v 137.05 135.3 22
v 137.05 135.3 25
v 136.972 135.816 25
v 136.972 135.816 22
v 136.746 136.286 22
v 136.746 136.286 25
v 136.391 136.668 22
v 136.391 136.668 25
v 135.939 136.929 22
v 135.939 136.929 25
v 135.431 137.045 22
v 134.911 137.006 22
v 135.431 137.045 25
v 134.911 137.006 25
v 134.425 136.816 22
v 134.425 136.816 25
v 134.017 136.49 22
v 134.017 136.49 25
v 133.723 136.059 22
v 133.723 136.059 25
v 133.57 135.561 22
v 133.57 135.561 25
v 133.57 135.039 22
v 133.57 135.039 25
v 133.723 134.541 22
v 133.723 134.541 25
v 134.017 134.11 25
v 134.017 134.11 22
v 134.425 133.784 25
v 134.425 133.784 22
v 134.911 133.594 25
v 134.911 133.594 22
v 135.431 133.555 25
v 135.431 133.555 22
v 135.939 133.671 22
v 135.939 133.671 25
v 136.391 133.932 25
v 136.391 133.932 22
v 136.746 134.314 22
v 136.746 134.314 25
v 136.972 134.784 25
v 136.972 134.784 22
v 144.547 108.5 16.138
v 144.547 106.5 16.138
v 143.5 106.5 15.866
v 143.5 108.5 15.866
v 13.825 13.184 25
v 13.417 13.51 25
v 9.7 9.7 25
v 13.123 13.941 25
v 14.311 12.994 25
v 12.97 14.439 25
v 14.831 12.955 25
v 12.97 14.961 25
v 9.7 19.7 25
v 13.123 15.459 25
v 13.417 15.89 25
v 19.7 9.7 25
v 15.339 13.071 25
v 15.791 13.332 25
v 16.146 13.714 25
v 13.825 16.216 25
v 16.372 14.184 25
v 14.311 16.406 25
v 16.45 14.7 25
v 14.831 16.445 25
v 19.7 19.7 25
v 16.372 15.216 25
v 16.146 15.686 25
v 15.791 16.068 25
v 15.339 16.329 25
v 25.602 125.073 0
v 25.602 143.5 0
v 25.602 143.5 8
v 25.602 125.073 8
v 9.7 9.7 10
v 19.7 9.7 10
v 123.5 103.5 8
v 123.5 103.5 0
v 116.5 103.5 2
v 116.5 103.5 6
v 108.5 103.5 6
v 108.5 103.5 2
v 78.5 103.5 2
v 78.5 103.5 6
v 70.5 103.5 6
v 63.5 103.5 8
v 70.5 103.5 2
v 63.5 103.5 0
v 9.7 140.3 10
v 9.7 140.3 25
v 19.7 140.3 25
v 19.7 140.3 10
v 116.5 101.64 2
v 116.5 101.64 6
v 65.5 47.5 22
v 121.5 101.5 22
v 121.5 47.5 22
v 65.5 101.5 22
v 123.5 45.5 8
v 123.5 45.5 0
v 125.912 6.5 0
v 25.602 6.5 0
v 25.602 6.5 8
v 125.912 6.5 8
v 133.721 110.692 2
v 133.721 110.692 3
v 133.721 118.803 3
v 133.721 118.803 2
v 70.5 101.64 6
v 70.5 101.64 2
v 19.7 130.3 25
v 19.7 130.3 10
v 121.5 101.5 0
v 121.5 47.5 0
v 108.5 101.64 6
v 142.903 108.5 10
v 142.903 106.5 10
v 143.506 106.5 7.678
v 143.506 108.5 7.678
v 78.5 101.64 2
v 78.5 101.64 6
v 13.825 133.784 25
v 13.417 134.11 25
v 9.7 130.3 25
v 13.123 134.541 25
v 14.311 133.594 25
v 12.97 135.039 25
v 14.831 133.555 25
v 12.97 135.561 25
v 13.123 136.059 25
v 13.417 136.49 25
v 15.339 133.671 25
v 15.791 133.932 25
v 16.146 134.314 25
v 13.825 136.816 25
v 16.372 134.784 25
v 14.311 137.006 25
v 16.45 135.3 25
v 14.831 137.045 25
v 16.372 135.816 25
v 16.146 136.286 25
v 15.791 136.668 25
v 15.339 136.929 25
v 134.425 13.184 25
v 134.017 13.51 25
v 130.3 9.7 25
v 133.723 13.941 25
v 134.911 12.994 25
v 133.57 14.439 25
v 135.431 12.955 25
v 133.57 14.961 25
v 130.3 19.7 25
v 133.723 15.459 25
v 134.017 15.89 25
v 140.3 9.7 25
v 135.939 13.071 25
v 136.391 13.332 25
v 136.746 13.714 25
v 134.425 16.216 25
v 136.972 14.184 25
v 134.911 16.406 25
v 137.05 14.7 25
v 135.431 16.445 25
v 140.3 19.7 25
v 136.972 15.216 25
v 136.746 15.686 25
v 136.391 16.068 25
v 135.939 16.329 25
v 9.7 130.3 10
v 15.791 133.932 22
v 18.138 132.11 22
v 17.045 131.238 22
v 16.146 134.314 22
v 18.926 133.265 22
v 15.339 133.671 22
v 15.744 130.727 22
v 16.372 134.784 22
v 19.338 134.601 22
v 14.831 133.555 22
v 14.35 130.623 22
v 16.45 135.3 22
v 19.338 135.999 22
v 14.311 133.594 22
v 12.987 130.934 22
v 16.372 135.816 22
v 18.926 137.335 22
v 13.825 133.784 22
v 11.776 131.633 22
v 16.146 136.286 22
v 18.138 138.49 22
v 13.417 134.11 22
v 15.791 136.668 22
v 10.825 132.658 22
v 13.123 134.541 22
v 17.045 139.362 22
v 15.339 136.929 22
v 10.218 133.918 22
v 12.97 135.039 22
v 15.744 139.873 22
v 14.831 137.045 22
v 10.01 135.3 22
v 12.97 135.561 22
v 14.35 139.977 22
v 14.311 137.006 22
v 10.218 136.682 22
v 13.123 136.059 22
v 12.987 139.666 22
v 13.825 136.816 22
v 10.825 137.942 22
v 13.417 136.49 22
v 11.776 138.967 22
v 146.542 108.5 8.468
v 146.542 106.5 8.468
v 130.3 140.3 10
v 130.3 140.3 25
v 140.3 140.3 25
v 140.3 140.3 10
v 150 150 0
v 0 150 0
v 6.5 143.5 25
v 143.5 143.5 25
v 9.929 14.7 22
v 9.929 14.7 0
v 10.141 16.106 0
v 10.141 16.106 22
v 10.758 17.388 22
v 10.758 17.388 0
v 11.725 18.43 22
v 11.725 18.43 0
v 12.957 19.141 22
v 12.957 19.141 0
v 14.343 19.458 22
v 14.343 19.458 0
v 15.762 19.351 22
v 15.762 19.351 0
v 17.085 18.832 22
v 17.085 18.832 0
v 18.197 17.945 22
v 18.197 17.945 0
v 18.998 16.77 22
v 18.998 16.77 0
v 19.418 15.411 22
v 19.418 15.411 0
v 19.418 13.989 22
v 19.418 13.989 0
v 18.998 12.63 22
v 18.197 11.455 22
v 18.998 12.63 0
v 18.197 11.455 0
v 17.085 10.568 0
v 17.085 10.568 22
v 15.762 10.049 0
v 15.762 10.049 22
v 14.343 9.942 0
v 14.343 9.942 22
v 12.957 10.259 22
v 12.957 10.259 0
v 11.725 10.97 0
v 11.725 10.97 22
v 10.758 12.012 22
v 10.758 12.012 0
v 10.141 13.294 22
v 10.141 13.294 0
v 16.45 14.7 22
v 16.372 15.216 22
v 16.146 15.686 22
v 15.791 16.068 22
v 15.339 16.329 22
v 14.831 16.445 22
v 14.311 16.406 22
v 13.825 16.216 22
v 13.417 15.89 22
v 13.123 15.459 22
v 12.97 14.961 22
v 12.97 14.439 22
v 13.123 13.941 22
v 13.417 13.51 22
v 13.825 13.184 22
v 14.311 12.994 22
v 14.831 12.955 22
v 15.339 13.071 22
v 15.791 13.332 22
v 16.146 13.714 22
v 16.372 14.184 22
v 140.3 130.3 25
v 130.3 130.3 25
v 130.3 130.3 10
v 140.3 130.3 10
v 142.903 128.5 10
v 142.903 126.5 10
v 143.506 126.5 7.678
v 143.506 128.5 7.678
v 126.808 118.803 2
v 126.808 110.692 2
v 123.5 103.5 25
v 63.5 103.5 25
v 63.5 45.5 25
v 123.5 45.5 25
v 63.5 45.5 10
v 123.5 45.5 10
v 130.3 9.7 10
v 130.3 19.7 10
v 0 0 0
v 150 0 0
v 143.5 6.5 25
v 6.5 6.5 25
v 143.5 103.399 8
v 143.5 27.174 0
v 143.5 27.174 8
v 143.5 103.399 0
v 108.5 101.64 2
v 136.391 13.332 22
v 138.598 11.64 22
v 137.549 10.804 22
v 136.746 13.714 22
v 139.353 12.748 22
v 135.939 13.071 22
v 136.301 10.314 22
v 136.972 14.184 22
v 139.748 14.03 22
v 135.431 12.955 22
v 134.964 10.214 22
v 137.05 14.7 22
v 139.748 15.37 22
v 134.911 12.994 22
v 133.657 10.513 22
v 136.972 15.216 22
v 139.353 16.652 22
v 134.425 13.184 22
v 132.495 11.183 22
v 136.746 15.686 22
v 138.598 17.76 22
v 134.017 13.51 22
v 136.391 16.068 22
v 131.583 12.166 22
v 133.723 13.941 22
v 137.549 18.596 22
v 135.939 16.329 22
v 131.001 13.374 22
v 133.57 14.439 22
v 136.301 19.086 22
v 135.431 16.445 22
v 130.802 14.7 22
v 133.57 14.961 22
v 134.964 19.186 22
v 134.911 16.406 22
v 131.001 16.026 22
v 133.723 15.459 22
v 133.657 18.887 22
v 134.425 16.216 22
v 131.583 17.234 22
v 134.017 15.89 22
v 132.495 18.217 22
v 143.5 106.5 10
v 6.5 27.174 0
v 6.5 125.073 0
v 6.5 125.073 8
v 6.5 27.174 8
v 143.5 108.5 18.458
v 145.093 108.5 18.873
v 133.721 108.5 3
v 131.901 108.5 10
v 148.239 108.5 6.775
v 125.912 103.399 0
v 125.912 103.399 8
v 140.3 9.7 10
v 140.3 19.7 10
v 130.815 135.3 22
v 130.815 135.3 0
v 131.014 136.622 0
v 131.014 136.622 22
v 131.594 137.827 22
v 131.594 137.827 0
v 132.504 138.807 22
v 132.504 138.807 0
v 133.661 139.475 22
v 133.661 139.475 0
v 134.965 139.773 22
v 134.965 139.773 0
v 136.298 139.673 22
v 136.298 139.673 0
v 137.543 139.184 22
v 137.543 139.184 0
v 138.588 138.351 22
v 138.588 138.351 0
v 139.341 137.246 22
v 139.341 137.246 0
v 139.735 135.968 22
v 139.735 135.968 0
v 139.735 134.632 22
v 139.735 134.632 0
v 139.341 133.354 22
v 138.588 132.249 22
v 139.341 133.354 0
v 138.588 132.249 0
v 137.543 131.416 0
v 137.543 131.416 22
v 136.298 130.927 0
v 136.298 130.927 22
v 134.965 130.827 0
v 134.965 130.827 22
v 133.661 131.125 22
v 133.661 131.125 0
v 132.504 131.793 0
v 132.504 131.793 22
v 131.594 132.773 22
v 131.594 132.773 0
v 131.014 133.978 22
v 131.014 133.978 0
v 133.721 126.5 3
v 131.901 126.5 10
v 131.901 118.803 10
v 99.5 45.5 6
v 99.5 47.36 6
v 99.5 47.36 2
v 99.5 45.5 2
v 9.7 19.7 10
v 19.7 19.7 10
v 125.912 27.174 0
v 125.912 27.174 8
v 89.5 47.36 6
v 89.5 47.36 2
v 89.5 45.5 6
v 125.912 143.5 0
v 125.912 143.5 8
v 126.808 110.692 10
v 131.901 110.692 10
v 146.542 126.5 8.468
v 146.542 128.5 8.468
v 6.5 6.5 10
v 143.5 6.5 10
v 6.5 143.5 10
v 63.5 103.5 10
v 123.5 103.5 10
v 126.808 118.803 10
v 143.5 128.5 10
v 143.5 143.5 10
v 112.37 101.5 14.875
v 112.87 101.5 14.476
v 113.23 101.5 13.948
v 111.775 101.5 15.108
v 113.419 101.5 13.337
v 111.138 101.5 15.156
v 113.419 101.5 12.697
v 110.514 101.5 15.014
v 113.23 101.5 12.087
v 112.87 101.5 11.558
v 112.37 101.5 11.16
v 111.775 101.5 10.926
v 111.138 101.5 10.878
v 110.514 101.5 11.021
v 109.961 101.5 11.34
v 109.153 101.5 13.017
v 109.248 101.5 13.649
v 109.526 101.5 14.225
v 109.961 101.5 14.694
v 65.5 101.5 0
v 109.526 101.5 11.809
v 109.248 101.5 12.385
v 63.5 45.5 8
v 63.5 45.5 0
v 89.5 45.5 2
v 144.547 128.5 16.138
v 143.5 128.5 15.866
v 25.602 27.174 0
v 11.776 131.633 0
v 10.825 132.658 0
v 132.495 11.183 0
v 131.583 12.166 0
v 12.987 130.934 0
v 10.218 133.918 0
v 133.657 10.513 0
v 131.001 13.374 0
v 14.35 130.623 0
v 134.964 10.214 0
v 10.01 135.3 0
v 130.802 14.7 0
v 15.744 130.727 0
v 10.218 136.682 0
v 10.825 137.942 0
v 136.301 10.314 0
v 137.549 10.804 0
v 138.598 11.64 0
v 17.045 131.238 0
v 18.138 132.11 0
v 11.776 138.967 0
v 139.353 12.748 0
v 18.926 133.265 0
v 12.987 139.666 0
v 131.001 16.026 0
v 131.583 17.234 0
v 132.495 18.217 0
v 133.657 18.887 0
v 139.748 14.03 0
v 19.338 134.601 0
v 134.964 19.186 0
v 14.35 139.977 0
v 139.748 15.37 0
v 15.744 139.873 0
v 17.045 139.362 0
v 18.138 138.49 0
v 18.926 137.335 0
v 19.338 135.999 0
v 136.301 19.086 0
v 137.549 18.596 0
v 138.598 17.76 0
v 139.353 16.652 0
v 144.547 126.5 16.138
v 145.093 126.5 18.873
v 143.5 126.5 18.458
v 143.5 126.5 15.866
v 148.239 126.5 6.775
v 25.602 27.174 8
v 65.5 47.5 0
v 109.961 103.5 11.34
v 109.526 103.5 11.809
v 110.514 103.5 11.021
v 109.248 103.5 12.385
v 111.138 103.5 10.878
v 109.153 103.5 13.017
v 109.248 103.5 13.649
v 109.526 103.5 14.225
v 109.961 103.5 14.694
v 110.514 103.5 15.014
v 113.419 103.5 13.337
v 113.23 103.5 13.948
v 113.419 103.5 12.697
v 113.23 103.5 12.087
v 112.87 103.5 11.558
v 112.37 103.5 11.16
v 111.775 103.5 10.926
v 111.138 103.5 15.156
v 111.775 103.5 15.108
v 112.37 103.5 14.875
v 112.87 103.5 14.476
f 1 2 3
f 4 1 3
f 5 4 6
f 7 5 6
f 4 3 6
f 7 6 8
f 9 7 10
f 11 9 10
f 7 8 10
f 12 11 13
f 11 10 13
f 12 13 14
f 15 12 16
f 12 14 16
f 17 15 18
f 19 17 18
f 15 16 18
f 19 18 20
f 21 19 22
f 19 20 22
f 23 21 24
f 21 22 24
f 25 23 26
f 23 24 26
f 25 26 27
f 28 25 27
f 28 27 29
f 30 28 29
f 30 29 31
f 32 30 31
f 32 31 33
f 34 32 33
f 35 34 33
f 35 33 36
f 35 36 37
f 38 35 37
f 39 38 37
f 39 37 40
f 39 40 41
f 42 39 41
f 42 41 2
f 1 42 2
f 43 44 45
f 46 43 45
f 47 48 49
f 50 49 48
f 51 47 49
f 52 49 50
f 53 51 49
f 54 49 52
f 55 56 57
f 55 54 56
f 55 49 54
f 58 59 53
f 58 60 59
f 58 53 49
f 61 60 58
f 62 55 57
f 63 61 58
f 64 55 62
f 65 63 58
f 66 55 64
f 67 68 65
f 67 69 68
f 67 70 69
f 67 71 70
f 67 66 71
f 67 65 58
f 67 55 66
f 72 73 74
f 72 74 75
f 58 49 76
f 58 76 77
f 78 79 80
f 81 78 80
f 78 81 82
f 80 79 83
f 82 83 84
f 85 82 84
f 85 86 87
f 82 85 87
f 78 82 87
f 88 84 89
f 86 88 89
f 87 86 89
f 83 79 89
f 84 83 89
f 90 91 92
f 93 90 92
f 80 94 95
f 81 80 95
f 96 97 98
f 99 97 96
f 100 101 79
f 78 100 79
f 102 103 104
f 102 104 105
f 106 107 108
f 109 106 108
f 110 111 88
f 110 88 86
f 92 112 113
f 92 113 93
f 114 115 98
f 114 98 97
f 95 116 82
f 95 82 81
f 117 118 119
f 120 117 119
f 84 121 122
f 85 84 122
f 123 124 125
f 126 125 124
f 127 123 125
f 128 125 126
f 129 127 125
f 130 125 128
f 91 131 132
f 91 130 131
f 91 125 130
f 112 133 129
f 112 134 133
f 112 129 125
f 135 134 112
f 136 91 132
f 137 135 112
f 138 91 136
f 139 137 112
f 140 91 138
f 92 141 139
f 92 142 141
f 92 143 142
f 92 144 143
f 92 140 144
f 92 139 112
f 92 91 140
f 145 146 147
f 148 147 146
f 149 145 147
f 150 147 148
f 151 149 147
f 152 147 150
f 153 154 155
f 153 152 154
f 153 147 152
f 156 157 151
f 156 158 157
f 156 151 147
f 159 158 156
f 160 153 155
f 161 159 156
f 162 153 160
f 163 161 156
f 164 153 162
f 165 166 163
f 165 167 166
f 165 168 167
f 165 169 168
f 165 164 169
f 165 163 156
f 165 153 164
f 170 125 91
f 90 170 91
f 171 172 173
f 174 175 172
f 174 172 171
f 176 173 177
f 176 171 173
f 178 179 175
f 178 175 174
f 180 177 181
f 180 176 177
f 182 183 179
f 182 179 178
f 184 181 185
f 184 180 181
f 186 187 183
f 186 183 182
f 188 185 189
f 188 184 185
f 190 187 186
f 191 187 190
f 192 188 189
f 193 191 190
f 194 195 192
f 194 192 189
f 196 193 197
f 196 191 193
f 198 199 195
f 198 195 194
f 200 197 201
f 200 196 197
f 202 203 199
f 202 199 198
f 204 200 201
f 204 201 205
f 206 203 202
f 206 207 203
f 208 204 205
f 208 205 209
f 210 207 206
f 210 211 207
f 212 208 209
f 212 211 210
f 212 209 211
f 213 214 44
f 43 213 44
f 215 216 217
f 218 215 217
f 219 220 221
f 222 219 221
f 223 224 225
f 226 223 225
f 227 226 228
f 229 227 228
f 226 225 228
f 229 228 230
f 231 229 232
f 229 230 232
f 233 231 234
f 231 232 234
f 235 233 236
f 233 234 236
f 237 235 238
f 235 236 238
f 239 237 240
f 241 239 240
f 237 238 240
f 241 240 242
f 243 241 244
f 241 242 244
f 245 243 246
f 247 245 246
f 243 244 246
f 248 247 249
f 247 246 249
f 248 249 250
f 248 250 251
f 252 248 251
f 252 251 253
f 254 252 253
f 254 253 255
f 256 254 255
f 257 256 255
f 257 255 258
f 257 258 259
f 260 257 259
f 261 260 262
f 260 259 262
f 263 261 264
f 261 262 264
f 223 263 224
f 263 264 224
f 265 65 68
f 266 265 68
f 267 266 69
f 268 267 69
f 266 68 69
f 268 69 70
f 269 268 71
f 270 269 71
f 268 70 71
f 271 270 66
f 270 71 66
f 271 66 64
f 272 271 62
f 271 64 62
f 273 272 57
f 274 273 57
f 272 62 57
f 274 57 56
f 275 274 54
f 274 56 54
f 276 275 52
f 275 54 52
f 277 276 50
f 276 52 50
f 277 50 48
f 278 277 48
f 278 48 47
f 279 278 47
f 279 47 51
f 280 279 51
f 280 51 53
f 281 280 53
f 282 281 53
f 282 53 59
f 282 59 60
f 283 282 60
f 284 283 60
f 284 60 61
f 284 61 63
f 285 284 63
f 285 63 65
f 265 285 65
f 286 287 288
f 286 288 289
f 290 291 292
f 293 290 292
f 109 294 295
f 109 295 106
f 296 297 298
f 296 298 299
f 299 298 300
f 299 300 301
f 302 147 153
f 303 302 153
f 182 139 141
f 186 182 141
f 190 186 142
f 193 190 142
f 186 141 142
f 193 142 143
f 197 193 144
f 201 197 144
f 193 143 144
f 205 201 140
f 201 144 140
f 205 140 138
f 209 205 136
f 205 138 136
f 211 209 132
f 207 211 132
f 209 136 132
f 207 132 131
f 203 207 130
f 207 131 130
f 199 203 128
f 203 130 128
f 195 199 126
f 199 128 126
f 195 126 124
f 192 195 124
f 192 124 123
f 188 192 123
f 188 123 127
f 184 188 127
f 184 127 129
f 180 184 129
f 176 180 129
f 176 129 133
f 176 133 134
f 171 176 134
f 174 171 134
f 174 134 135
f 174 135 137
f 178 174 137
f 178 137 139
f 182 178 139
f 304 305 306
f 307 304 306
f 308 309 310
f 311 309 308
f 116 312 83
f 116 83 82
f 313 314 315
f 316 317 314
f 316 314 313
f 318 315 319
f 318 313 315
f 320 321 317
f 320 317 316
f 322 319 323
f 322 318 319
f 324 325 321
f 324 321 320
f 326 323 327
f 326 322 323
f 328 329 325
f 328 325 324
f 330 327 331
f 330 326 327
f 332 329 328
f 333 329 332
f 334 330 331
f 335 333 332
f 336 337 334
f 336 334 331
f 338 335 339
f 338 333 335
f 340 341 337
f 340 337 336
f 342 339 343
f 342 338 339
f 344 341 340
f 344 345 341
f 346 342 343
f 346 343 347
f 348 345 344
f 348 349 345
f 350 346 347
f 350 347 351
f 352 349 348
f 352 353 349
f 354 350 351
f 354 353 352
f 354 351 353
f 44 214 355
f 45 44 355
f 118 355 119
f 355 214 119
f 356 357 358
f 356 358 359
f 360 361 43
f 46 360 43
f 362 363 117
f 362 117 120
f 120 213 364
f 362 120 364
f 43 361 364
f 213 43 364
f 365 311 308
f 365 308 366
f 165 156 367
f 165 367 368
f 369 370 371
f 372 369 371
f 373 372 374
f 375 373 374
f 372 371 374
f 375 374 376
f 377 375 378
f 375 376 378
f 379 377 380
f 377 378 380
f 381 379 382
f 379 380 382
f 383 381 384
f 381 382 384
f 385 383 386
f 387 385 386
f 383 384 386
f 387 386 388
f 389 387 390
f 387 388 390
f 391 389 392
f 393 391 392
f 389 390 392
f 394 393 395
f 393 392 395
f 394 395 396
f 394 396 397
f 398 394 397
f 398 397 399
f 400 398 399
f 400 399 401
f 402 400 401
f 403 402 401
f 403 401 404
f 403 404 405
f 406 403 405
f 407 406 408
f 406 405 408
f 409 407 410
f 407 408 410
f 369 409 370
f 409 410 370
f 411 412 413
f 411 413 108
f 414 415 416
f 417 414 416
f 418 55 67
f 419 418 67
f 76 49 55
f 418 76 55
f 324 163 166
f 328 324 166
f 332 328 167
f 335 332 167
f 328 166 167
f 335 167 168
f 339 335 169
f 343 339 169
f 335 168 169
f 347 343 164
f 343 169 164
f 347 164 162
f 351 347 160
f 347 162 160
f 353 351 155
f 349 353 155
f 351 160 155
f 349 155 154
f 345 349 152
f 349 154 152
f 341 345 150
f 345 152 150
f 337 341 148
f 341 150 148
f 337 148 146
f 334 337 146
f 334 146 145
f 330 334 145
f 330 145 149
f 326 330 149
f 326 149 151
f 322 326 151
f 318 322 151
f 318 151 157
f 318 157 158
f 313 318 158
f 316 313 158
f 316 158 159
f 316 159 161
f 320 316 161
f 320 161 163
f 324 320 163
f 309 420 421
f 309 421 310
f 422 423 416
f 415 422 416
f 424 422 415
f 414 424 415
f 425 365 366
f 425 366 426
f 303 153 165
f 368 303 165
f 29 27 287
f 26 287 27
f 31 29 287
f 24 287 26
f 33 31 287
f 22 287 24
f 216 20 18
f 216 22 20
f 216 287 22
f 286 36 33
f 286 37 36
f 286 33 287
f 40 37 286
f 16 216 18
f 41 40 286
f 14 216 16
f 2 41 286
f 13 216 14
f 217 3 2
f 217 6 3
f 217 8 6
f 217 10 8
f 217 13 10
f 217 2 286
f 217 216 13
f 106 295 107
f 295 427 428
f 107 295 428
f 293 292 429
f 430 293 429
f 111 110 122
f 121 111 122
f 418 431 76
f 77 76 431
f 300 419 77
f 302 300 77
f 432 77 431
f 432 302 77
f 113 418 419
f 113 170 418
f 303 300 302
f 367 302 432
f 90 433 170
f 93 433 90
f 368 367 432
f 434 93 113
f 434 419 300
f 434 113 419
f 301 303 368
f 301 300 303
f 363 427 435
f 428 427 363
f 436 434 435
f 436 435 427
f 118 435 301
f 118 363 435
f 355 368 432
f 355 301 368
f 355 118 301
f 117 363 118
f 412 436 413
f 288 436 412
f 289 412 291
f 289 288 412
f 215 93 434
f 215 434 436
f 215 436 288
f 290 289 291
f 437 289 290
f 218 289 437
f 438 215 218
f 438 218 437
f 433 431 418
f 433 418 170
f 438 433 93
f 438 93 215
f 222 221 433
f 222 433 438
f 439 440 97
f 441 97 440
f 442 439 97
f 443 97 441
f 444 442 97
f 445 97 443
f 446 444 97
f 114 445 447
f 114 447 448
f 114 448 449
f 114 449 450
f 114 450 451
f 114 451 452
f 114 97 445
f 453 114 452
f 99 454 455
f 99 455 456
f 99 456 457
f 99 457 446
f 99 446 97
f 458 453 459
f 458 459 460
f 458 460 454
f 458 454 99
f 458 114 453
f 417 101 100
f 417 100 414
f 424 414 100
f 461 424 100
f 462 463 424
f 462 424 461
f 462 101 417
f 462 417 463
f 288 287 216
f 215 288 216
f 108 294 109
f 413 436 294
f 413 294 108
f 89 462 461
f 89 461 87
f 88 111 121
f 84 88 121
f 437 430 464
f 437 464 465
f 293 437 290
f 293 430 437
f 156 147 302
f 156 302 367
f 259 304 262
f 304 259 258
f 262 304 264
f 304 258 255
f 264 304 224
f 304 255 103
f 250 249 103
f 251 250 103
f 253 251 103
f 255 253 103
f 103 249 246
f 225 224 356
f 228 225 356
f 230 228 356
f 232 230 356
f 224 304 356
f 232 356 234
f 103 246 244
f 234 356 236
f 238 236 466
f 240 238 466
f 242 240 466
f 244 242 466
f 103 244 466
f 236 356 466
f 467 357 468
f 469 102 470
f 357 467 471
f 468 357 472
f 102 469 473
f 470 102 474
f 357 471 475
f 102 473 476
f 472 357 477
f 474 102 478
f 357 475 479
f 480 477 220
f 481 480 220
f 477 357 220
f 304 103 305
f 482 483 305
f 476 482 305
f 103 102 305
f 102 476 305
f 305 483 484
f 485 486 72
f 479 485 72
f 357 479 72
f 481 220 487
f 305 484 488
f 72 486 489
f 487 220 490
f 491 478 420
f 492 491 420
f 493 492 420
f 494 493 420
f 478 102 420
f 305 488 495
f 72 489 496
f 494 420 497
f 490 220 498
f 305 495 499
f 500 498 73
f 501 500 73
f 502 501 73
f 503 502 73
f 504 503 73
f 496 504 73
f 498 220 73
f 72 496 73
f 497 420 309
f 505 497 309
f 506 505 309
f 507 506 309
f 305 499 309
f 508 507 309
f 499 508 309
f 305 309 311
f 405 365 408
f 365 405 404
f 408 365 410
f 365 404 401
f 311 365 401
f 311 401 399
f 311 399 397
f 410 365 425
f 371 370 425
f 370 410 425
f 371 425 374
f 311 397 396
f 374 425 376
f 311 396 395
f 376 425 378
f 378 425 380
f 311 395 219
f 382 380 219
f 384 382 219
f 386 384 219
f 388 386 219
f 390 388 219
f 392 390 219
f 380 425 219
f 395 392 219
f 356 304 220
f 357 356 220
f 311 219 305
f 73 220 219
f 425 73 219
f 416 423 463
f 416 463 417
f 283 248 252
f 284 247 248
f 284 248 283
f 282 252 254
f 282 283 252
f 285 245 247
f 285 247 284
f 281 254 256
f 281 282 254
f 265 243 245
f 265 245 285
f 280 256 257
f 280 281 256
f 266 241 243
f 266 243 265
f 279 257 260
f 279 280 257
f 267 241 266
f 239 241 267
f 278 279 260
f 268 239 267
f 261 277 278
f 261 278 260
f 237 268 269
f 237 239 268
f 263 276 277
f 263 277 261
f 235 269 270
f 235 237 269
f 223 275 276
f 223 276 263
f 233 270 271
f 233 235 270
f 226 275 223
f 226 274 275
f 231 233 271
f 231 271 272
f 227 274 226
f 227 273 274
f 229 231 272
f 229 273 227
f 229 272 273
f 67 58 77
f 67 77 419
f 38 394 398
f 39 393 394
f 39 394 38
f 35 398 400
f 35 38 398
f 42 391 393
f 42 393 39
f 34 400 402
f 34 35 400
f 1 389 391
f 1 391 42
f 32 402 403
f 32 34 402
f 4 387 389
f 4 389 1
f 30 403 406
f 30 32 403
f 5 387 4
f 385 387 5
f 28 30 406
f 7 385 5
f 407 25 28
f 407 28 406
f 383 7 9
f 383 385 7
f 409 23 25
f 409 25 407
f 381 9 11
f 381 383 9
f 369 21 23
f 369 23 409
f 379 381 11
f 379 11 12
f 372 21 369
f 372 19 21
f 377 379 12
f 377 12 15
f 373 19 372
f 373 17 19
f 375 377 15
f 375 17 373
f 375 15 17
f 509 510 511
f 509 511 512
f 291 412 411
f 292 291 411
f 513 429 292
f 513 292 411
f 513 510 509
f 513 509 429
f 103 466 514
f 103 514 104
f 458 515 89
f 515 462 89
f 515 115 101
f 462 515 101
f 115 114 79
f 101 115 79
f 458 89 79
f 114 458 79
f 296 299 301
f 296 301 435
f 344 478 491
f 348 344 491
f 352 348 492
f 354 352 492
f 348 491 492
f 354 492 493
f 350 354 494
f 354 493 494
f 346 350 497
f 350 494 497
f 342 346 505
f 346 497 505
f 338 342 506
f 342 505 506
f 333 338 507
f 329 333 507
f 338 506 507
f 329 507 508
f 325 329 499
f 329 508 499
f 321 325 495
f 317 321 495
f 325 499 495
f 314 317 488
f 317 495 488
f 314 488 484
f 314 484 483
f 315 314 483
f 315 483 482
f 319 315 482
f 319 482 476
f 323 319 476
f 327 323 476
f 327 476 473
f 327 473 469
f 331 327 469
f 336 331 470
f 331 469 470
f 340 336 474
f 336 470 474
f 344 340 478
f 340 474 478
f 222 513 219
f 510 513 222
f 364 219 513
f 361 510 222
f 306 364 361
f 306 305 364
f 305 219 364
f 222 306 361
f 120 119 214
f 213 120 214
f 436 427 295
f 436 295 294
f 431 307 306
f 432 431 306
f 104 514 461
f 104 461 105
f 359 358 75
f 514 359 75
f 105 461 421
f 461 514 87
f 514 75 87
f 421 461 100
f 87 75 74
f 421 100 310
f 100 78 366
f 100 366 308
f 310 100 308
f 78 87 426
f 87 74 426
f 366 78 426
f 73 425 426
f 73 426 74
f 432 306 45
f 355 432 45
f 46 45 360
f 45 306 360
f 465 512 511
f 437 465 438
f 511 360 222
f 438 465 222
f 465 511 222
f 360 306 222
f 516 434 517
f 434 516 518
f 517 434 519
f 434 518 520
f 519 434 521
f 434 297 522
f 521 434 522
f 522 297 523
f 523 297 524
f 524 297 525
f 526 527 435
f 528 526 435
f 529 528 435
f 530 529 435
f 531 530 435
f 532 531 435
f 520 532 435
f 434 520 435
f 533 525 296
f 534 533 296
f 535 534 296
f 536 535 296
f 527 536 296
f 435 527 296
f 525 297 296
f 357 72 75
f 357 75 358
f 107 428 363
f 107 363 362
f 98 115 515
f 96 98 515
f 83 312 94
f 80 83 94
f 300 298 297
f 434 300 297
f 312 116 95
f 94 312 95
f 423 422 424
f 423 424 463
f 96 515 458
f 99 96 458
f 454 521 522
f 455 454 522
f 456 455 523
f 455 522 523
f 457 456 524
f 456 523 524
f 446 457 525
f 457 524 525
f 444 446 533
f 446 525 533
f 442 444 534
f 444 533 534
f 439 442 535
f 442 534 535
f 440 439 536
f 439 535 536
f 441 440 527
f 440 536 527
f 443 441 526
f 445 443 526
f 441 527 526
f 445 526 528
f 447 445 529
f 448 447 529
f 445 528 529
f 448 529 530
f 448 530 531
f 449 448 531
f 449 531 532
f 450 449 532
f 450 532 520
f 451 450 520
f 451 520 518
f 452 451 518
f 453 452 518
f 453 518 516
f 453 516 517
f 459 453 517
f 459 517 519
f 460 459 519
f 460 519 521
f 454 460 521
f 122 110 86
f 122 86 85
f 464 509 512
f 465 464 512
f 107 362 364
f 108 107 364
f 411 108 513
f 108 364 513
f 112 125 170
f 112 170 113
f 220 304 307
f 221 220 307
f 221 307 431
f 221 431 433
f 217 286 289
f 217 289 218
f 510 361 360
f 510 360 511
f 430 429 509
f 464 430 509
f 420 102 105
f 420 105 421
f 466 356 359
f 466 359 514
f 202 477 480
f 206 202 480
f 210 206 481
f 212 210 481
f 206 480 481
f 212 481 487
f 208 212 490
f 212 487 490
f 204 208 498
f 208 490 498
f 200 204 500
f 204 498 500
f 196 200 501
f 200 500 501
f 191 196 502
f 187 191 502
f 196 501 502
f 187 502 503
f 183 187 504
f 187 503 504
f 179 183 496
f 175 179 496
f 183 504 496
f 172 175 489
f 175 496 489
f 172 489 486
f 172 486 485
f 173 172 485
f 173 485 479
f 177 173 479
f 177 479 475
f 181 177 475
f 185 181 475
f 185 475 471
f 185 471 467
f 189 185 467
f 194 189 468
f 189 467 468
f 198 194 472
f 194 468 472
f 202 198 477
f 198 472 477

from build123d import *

# Parameters (mm, degrees)
ESQUISSE1_W                  = 150
ESQUISSE1_H                  = 150
BOSS_EXTRU_1_DEPTH           = 25
CHANFREIN1_SIZE              = 25
CHANFREIN1_SIZE_2            = 6.5
ESQUISSE2_W                  = 137
ESQUISSE2_H                  = 137
ESQUISSE2_W_2                = 10
ESQUISSE2_H_2                = 10
ESQUISSE2_W_3                = 60
ESQUISSE2_H_3                = 58
ESQUISSE2_R                  = 1.75
ENL_V_MAT_EXTRU_2_DEPTH      = 15
ESQUISSE3_W                  = 12.5
ESQUISSE3_H                  = 18
ENL_V_MAT_EXTRU_3_DEPTH      = 15
ENL_V_MAT_EXTRU_4_DEPTH      = 20
ENL_V_MAT_EXTRU_4_DEPTH_BACK = 2
ESQUISSE5_W                  = 60
ESQUISSE5_H                  = 58
ESQUISSE5_W_2                = 56
ESQUISSE5_H_2                = 54
ENL_V_MAT_EXTRU_7_DEPTH      = 8
ESQUISSE6_W                  = 56
ESQUISSE6_H                  = 54
ENL_V_MAT_EXTRU_6_DEPTH      = 22
ESQUISSE7_W                  = 8
ESQUISSE7_H                  = 4
ENL_V_MAT_EXTRU_13_DEPTH     = 8
ESQUISSE8_R                  = 2.14482531
ENL_V_MAT_EXTRU_9_DEPTH      = 8
ESQUISSE9_R                  = 4.485216979
ESQUISSE9_R_2                = 4.690098516
ESQUISSE9_R_3                = 4.770954249
ESQUISSE9_R_4                = 4.498432912
ENL_V_MAT_EXTRU_10_DEPTH     = 22
ESQUISSE10_W                 = 6.913683137
ESQUISSE10_H                 = 8.110809872
ENL_V_MAT_EXTRU_11_DEPTH     = 8
ESQUISSE11_W                 = 10
ESQUISSE11_H                 = 4
ENL_V_MAT_EXTRU_12_DEPTH     = 8


with BuildPart() as part:
    # Esquisse1 → Boss.-Extru.1 (new body)
    with BuildSketch(Plane.XY):
        with Locations((75, 75)):
            Rectangle(ESQUISSE1_W, ESQUISSE1_H)
    extrude(amount=BOSS_EXTRU_1_DEPTH)

    # Chanfrein1
    # the kernel refuses this chamfer: 25, 6.5 mm, written as the material it takes off along each edge
    with BuildSketch(Plane(origin=(150, -64.922604179, 25), x_dir=(0.00968976271621493, 0, -0.9999530531472482), z_dir=(0, 1, 0)), Plane(origin=(214.922604179, 150, 25), x_dir=(0, 0.00968976271621493, -0.9999530531472482), z_dir=(-1, 0, 0)), Plane(origin=(0, 214.922604179, 25), x_dir=(-0.009689762716214955, 0, -0.9999530531472482), z_dir=(0, -1, 0)), Plane(origin=(-64.922604179, 0, 25), x_dir=(0, -0.009689762716214955, -0.9999530531472482), z_dir=(1, 0, 0))) as chanfrein1_piece_1:
        Polygon((CHANFREIN1_SIZE * 0.999953053147, CHANFREIN1_SIZE * 0.00968976271621), (-CHANFREIN1_SIZE_2 * 0.00968976271621, CHANFREIN1_SIZE_2 * 0.999953053147), (0, 0), align=None)
    extrude(amount=279.845208358, mode=Mode.SUBTRACT)

    # Esquisse2 → Enlèv. mat.-Extru.2 (cut)
    # profile 1 of 5: a face of its own
    with BuildSketch(Plane.XY.offset(25)):
        with Locations((75, 75)):
            Rectangle(ESQUISSE2_W, ESQUISSE2_H)
        with Locations((14.7, 14.7)):
            Rectangle(ESQUISSE2_W_2, ESQUISSE2_H_2, mode=Mode.SUBTRACT)
        with Locations((135.3, 14.7)):
            Rectangle(ESQUISSE2_W_2, ESQUISSE2_H_2, mode=Mode.SUBTRACT)
        with Locations((93.5, 74.5)):
            Rectangle(ESQUISSE2_W_3, ESQUISSE2_H_3, mode=Mode.SUBTRACT)
        with Locations((14.7, 135.3)):
            Rectangle(ESQUISSE2_W_2, ESQUISSE2_H_2, mode=Mode.SUBTRACT)
        with Locations((135.3, 135.3)):
            Rectangle(ESQUISSE2_W_2, ESQUISSE2_H_2, mode=Mode.SUBTRACT)
    # profile 2 of 5: a face of its own
    with BuildSketch(Plane.XY.offset(25)):
        with Locations((14.7, 135.3)):
            Circle(ESQUISSE2_R)
    # profile 3 of 5: a face of its own
    with BuildSketch(Plane.XY.offset(25)):
        with Locations((135.3, 135.3)):
            Circle(ESQUISSE2_R)
    # profile 4 of 5: a face of its own
    with BuildSketch(Plane.XY.offset(25)):
        with Locations((135.3, 14.7)):
            Circle(ESQUISSE2_R)
    # profile 5 of 5: a face of its own
    with BuildSketch(Plane.XY.offset(25)):
        with Locations((14.7, 14.7)):
            Circle(ESQUISSE2_R)
    extrude(amount=-ENL_V_MAT_EXTRU_2_DEPTH, mode=Mode.SUBTRACT)

    # Esquisse3 → Enlèv. mat.-Extru.3 (cut)
    with BuildSketch(Plane(origin=(140.502060697, 0, 36.530535781), x_dir=(0.2516338517649486, 0, -0.9678225067882726), z_dir=(0.9678225067882725, 0, 0.25163385176494857))):
        with Locations((24.495077765, 117.5)):
            Rectangle(ESQUISSE3_W, ESQUISSE3_H)
    extrude(amount=-ENL_V_MAT_EXTRU_3_DEPTH, mode=Mode.SUBTRACT)

    # Esquisse4 → Enlèv. mat.-Extru.4 (cut, two sides: drawn at the far end of the back side and taken through both)
    with BuildSketch(Plane(origin=(0, 108.5, 0), x_dir=(1, 0, 0), z_dir=(0, 1, 0)).offset(-ENL_V_MAT_EXTRU_4_DEPTH_BACK)):
        Polygon((146.541727915, -8.467609261), (144.547390296, -16.138138565), (141.512044488, -15.348948655), (143.506382107, -7.678419351), align=None)
    extrude(amount=ENL_V_MAT_EXTRU_4_DEPTH + ENL_V_MAT_EXTRU_4_DEPTH_BACK, mode=Mode.SUBTRACT)

    # Esquisse5 → Enlèv. mat.-Extru.7 (cut)
    # profile 1 of 2: a face of its own
    with BuildSketch(Plane(origin=(0, 0, 0), x_dir=(-1, 0, 0), z_dir=(0, 0, -1))):
        Polygon((-125.912264941, 103.398684795), (-125.912264941, 143.5), (-25.60196638, 143.5), (-25.60196638, 125.072705698), (-6.5, 125.072705698), (-6.5, 27.173820188), (-25.60196638, 27.173820188), (-25.60196638, 6.5), (-125.912264941, 6.5), (-125.912264941, 27.173820188), (-143.5, 27.173820188), (-143.5, 103.398684795), align=None)
        with Locations((-93.5, 74.5)):
            Rectangle(ESQUISSE5_W, ESQUISSE5_H, mode=Mode.SUBTRACT)
    # profile 2 of 2: a face of its own
    with BuildSketch(Plane(origin=(0, 0, 0), x_dir=(-1, 0, 0), z_dir=(0, 0, -1))):
        with Locations((-93.5, 74.5)):
            Rectangle(ESQUISSE5_W_2, ESQUISSE5_H_2)
    extrude(amount=-ENL_V_MAT_EXTRU_7_DEPTH, mode=Mode.SUBTRACT)

    # Esquisse6 → Enlèv. mat.-Extru.6 (cut)
    with BuildSketch(Plane(origin=(0, 0, 0), x_dir=(-1, 0, 0), z_dir=(0, 0, -1))):
        with Locations((-93.5, 74.5)):
            Rectangle(ESQUISSE6_W, ESQUISSE6_H)
    extrude(amount=-ENL_V_MAT_EXTRU_6_DEPTH, mode=Mode.SUBTRACT)

    # Esquisse7 → Enlèv. mat.-Extru.13 (cut)
    with BuildSketch(Plane.XZ.offset(-101.640366459)):
        with Locations((74.5, 4)):
            Rectangle(ESQUISSE7_W, ESQUISSE7_H)
        with Locations((112.5, 4)):
            Rectangle(ESQUISSE7_W, ESQUISSE7_H)
    extrude(amount=-ENL_V_MAT_EXTRU_13_DEPTH, mode=Mode.SUBTRACT)

    # Esquisse8 → Enlèv. mat.-Extru.9 (cut)
    with BuildSketch(Plane(origin=(0, 103.5, 0), x_dir=(1, 0, 0), z_dir=(0, 1, 0))):
        with Locations(Location((111.298002562, -13.017125877, 0), (0, 0, 180))):
            Circle(ESQUISSE8_R)
    extrude(amount=-ENL_V_MAT_EXTRU_9_DEPTH, mode=Mode.SUBTRACT)

    # Esquisse9 → Enlèv. mat.-Extru.10 (cut)
    with BuildSketch(Plane(origin=(0, 0, 0), x_dir=(-1, 0, 0), z_dir=(0, 0, -1))):
        with Locations((-135.3, 135.3)):
            Circle(ESQUISSE9_R)
        with Locations((-14.7, 135.3)):
            Circle(ESQUISSE9_R_2)
        with Locations((-14.7, 14.7)):
            Circle(ESQUISSE9_R_3)
        with Locations((-135.3, 14.7)):
            Circle(ESQUISSE9_R_4)
    extrude(amount=-ENL_V_MAT_EXTRU_10_DEPTH, mode=Mode.SUBTRACT)

    # Esquisse10 → Enlèv. mat.-Extru.11 (cut)
    with BuildSketch(Plane.XY.offset(10)):
        with Locations((130.264383867, 114.747246467)):
            Rectangle(ESQUISSE10_W, ESQUISSE10_H)
    extrude(amount=-ENL_V_MAT_EXTRU_11_DEPTH, mode=Mode.SUBTRACT)

    # Esquisse11 → Enlèv. mat.-Extru.12 (cut)
    with BuildSketch(Plane(origin=(0, 47.359633541, 0), x_dir=(1, 0, 0), z_dir=(0, 1, 0))):
        with Locations((94.5, -4)):
            Rectangle(ESQUISSE11_W, ESQUISSE11_H)
    extrude(amount=-ENL_V_MAT_EXTRU_12_DEPTH, mode=Mode.SUBTRACT)


solid = part.part
